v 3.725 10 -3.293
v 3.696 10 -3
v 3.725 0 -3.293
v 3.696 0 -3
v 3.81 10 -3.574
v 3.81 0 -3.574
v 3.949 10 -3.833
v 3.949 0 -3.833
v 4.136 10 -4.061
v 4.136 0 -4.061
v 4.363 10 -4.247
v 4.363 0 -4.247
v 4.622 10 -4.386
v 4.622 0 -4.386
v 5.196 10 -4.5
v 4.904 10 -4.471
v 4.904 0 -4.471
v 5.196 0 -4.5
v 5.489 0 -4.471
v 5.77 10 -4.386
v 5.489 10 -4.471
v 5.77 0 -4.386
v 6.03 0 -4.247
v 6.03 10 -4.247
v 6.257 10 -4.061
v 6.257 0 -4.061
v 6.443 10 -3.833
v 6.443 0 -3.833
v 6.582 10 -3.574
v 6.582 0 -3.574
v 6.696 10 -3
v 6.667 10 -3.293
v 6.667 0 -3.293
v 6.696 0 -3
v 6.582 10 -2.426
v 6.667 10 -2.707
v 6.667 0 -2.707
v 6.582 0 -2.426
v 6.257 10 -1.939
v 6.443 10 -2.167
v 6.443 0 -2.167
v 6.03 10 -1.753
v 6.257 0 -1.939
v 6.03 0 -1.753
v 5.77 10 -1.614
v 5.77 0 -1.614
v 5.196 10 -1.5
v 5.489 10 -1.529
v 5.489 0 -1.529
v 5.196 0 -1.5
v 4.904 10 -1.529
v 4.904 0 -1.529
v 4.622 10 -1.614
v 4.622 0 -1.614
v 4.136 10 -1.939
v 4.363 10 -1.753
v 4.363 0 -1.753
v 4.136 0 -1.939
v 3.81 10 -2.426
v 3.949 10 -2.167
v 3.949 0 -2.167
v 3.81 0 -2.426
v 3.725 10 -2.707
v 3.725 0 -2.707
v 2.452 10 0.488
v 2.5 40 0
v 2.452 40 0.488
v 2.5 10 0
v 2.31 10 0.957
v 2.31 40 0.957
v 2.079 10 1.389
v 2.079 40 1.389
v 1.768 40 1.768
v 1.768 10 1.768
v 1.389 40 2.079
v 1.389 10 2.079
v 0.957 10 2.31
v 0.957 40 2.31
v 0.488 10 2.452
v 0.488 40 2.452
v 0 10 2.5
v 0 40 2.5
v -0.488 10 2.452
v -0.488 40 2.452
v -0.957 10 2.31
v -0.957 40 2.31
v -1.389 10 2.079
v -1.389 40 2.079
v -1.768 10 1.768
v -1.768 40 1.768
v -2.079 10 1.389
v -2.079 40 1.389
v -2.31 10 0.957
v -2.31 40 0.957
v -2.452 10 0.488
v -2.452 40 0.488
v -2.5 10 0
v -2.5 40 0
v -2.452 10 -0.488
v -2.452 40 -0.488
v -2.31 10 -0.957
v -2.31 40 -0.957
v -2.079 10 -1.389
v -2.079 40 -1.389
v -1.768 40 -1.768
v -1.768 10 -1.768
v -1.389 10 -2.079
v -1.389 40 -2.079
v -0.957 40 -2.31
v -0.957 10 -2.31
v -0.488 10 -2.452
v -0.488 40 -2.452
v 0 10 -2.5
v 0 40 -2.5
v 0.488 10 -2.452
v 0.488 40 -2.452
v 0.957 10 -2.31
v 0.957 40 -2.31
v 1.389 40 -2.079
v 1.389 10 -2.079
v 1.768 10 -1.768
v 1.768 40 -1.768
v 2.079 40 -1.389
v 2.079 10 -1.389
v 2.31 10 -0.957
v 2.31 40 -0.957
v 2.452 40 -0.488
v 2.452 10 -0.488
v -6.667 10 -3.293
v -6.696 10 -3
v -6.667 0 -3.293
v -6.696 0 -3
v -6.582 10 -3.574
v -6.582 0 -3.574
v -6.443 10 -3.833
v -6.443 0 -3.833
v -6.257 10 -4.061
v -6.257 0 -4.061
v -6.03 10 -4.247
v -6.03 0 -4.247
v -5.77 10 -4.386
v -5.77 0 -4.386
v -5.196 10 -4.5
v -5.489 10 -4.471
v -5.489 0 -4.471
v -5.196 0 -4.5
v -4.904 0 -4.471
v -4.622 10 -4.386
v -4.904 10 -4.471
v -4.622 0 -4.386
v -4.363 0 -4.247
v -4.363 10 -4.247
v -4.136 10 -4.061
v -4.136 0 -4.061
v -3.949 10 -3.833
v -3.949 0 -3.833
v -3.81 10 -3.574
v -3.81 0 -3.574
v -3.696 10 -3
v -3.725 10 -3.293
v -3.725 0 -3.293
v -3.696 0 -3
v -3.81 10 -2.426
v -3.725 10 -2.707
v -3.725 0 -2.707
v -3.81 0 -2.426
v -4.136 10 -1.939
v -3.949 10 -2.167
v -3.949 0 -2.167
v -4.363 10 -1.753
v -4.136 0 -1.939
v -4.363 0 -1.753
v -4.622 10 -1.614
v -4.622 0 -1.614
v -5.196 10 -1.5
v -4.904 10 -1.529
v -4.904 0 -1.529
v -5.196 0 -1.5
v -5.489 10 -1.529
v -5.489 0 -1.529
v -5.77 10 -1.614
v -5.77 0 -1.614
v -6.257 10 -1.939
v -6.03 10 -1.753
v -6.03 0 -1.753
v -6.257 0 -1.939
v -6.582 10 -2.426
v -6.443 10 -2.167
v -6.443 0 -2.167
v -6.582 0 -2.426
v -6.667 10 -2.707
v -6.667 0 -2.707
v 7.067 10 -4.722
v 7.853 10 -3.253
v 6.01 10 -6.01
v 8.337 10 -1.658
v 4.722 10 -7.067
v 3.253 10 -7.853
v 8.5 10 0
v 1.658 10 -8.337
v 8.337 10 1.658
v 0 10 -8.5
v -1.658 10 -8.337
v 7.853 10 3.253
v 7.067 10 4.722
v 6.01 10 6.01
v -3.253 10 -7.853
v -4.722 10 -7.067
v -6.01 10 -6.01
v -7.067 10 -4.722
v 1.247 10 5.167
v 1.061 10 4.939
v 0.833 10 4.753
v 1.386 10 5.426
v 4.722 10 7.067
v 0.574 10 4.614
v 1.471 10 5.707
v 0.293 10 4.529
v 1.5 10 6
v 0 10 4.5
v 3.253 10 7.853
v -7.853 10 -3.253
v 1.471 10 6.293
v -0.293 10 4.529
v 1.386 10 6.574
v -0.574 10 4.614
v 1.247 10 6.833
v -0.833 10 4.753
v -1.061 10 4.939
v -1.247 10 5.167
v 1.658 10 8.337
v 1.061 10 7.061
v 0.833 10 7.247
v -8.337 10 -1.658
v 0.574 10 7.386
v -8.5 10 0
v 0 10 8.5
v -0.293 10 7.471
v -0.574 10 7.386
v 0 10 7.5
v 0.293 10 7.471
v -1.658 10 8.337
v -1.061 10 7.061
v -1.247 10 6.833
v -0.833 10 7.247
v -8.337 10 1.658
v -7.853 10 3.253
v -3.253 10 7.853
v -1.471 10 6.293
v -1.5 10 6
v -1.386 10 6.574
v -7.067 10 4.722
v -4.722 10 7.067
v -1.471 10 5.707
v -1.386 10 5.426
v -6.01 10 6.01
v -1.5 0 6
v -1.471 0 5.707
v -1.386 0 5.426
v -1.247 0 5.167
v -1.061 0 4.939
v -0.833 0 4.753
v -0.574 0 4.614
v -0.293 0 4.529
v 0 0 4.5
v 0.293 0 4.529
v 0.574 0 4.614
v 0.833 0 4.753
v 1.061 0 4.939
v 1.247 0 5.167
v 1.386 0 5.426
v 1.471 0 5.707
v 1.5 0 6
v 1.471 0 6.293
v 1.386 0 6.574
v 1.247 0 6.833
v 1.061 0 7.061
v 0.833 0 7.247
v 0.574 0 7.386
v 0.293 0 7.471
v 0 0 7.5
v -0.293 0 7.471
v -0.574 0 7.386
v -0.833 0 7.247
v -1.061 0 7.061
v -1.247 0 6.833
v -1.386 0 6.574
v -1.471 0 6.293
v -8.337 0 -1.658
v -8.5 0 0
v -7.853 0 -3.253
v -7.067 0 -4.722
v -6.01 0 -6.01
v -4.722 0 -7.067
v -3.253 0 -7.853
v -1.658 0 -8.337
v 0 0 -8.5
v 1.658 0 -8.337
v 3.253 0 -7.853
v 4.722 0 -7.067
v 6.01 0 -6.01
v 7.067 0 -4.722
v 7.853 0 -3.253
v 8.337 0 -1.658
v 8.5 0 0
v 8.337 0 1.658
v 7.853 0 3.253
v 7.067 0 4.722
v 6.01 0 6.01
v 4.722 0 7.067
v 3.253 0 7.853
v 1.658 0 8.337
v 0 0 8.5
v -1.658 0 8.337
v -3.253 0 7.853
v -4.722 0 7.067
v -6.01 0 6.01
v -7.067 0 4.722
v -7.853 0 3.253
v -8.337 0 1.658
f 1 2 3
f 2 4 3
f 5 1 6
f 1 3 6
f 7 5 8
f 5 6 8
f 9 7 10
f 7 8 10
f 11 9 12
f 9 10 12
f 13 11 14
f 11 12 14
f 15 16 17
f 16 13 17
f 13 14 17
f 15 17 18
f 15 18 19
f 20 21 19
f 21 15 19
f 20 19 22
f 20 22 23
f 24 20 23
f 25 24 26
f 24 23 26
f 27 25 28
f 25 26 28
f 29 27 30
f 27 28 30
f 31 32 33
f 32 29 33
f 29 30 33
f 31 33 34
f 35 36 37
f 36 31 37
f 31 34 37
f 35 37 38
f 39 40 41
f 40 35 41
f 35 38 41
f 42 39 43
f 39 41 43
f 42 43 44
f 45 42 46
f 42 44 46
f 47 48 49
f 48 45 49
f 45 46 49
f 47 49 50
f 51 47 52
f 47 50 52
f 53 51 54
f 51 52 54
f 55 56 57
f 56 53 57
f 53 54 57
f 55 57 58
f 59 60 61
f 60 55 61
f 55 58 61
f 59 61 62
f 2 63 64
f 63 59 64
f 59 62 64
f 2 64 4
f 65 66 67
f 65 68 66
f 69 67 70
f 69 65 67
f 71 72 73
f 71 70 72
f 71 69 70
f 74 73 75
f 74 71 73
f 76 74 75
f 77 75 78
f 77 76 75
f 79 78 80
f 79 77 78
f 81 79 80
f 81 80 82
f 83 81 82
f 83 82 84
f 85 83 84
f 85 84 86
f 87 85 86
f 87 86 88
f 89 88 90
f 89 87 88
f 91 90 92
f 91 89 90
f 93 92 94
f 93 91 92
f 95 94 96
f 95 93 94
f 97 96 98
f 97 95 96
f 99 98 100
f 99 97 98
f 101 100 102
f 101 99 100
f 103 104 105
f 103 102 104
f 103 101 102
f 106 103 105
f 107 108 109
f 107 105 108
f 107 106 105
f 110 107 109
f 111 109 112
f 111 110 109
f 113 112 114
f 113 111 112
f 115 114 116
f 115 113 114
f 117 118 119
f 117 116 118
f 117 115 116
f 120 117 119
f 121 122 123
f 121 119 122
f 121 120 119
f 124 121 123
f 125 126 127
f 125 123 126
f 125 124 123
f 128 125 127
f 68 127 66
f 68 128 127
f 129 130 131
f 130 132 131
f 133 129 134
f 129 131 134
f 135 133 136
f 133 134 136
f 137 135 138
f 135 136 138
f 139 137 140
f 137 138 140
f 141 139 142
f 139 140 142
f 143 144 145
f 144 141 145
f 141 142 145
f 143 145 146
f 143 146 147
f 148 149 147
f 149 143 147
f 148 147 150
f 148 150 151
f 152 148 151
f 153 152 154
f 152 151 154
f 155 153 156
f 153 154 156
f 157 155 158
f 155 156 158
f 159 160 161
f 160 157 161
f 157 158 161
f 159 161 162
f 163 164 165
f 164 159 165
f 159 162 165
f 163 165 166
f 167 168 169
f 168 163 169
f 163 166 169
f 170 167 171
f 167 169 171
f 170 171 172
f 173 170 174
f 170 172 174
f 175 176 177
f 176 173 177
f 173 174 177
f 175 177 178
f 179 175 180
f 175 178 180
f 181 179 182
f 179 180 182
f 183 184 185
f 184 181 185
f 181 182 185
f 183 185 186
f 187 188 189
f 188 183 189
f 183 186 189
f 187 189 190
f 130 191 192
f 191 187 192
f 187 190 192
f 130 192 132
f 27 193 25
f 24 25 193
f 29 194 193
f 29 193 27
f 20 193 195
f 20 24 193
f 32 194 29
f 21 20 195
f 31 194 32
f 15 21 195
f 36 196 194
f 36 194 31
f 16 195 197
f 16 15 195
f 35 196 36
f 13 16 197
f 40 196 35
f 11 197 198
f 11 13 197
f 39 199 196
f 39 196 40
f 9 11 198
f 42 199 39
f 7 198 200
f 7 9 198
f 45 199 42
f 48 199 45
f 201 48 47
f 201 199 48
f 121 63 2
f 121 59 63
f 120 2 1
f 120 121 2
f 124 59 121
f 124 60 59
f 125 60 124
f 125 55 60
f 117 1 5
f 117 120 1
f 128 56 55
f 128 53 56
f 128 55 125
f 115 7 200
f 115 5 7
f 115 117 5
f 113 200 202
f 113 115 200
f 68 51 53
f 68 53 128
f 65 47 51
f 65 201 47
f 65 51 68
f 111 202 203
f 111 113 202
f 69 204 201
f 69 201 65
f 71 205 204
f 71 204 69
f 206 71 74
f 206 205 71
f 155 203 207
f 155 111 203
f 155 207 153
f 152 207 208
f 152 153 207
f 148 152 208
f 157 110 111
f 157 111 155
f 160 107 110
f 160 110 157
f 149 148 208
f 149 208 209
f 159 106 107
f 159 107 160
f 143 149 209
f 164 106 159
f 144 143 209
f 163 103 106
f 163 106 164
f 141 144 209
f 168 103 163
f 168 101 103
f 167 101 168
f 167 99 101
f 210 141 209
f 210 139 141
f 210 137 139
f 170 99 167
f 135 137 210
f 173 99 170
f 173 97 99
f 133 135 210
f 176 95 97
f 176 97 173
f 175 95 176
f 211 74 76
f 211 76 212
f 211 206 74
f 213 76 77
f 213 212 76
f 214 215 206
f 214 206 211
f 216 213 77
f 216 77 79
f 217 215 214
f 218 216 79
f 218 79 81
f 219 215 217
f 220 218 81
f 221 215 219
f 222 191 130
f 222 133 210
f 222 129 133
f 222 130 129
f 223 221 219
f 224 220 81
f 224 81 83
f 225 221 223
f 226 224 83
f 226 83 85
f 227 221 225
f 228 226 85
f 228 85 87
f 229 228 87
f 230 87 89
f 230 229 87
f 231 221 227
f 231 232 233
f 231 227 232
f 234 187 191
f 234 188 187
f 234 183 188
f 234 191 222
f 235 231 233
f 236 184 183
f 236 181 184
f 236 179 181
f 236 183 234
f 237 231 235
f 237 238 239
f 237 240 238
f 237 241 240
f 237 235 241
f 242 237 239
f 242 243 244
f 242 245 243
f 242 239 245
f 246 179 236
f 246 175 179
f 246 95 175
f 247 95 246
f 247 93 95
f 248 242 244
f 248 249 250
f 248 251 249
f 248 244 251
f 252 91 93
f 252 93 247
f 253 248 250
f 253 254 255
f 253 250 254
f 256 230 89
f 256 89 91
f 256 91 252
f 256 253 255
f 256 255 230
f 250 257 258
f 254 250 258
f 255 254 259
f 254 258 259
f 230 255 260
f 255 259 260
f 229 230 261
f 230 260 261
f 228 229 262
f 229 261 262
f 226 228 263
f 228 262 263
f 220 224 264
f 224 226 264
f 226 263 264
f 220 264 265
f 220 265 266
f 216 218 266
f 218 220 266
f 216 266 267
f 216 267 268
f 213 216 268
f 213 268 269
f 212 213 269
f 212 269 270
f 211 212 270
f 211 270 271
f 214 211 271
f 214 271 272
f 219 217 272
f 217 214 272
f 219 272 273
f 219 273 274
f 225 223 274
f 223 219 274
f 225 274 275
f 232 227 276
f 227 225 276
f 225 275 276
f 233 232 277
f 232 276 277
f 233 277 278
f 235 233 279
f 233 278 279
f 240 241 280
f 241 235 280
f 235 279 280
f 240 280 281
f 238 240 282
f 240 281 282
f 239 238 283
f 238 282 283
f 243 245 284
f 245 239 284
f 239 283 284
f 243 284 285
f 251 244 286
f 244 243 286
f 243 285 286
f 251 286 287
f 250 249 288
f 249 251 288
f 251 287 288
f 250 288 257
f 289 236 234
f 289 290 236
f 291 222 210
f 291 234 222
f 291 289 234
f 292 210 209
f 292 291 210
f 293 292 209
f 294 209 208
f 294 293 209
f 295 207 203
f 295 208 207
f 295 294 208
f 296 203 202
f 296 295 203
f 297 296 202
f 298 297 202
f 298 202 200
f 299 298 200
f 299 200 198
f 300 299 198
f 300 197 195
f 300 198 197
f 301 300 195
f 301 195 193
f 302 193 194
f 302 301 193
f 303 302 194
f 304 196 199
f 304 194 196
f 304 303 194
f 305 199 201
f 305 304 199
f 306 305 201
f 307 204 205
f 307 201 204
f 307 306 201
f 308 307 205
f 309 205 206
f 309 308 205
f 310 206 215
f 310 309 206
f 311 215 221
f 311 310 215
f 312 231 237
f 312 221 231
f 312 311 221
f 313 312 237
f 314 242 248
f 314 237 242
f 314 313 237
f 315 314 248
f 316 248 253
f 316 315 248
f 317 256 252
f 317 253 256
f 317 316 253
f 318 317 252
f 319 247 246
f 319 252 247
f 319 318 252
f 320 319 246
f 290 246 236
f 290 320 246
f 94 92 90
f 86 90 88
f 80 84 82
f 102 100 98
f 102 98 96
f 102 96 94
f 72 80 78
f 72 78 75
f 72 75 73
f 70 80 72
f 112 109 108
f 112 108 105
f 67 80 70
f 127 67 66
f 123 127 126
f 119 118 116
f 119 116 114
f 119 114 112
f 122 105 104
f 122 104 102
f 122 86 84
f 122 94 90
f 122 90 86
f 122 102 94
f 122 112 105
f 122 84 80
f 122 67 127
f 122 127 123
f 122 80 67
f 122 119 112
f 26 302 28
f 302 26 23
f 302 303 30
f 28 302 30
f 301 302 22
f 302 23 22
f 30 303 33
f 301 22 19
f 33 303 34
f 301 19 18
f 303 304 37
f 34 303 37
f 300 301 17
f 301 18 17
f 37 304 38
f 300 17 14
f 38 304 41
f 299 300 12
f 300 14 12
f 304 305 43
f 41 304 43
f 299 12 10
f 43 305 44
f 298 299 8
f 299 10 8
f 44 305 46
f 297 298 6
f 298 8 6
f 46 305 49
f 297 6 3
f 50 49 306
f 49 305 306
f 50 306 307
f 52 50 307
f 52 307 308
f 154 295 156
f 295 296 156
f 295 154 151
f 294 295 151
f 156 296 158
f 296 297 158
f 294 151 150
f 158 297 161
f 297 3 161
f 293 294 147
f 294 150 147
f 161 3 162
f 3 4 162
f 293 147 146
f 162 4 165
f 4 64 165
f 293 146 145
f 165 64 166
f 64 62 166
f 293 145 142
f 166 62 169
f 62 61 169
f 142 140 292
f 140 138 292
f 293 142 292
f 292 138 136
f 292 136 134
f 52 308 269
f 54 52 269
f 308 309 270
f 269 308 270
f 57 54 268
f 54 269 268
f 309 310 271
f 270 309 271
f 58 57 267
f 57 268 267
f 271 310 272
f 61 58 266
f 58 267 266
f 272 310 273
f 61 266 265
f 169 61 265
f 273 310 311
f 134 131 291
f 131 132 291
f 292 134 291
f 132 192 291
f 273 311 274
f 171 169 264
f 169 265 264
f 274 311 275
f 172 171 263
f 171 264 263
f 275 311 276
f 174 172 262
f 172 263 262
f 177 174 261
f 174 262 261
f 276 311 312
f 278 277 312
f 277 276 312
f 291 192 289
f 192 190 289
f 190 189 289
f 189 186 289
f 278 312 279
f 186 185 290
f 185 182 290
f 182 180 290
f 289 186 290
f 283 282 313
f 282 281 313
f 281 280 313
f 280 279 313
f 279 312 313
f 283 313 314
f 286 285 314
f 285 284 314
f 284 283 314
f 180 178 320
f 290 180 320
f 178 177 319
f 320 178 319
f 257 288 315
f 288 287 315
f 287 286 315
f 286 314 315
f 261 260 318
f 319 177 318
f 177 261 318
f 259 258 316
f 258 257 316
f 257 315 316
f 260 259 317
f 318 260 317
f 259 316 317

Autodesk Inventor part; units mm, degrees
ref_plane "YZ Plane" through (0, 0, 0) normal (1, 0, 0) x (0, 1, 0)
ref_plane "XZ Plane" through (0, 0, 0) normal (0, 1, 0) x (-1, 0, 0)
ref_plane "XY Plane" through (0, 0, 0) normal (0, 0, 1) x (1, 0, 0)
sketch "Sketch1" plane through (0, 0, 0) normal (0, 1, 0) x (-1, 0, 0)
  circle A0 centre (0, 0) radius 8.5
  circle A1 centre (5.1962, -3) radius 1.5
  circle A2 centre (5.1962, -3) radius 1.5
  circle A3 centre (-5.1962, -3) radius 1.5
  circle A4 centre (-5.1962, -3) radius 1.5
  circle A5 centre (0, 6) radius 1.5
  circle A6 centre (0, 6) radius 1.5
  point P0 (0, 0)
extrude "Extrusion1" add sketch "Sketch1" along normal blind 10
sketch "Sketch2" plane through (0, 10, 0) normal (0, 1, 0) x (1, 0, 0)
  circle A0 centre (0, 0) radius 2.5
  dimension "d3" = 5
extrude "Extrusion2" add sketch "Sketch2" along normal blind 30
thread "Thread1" size "12-24 UNC" class "2A" standard "ANSI Unified Screw Threads" length 25.4
properties part number "Motor top"
